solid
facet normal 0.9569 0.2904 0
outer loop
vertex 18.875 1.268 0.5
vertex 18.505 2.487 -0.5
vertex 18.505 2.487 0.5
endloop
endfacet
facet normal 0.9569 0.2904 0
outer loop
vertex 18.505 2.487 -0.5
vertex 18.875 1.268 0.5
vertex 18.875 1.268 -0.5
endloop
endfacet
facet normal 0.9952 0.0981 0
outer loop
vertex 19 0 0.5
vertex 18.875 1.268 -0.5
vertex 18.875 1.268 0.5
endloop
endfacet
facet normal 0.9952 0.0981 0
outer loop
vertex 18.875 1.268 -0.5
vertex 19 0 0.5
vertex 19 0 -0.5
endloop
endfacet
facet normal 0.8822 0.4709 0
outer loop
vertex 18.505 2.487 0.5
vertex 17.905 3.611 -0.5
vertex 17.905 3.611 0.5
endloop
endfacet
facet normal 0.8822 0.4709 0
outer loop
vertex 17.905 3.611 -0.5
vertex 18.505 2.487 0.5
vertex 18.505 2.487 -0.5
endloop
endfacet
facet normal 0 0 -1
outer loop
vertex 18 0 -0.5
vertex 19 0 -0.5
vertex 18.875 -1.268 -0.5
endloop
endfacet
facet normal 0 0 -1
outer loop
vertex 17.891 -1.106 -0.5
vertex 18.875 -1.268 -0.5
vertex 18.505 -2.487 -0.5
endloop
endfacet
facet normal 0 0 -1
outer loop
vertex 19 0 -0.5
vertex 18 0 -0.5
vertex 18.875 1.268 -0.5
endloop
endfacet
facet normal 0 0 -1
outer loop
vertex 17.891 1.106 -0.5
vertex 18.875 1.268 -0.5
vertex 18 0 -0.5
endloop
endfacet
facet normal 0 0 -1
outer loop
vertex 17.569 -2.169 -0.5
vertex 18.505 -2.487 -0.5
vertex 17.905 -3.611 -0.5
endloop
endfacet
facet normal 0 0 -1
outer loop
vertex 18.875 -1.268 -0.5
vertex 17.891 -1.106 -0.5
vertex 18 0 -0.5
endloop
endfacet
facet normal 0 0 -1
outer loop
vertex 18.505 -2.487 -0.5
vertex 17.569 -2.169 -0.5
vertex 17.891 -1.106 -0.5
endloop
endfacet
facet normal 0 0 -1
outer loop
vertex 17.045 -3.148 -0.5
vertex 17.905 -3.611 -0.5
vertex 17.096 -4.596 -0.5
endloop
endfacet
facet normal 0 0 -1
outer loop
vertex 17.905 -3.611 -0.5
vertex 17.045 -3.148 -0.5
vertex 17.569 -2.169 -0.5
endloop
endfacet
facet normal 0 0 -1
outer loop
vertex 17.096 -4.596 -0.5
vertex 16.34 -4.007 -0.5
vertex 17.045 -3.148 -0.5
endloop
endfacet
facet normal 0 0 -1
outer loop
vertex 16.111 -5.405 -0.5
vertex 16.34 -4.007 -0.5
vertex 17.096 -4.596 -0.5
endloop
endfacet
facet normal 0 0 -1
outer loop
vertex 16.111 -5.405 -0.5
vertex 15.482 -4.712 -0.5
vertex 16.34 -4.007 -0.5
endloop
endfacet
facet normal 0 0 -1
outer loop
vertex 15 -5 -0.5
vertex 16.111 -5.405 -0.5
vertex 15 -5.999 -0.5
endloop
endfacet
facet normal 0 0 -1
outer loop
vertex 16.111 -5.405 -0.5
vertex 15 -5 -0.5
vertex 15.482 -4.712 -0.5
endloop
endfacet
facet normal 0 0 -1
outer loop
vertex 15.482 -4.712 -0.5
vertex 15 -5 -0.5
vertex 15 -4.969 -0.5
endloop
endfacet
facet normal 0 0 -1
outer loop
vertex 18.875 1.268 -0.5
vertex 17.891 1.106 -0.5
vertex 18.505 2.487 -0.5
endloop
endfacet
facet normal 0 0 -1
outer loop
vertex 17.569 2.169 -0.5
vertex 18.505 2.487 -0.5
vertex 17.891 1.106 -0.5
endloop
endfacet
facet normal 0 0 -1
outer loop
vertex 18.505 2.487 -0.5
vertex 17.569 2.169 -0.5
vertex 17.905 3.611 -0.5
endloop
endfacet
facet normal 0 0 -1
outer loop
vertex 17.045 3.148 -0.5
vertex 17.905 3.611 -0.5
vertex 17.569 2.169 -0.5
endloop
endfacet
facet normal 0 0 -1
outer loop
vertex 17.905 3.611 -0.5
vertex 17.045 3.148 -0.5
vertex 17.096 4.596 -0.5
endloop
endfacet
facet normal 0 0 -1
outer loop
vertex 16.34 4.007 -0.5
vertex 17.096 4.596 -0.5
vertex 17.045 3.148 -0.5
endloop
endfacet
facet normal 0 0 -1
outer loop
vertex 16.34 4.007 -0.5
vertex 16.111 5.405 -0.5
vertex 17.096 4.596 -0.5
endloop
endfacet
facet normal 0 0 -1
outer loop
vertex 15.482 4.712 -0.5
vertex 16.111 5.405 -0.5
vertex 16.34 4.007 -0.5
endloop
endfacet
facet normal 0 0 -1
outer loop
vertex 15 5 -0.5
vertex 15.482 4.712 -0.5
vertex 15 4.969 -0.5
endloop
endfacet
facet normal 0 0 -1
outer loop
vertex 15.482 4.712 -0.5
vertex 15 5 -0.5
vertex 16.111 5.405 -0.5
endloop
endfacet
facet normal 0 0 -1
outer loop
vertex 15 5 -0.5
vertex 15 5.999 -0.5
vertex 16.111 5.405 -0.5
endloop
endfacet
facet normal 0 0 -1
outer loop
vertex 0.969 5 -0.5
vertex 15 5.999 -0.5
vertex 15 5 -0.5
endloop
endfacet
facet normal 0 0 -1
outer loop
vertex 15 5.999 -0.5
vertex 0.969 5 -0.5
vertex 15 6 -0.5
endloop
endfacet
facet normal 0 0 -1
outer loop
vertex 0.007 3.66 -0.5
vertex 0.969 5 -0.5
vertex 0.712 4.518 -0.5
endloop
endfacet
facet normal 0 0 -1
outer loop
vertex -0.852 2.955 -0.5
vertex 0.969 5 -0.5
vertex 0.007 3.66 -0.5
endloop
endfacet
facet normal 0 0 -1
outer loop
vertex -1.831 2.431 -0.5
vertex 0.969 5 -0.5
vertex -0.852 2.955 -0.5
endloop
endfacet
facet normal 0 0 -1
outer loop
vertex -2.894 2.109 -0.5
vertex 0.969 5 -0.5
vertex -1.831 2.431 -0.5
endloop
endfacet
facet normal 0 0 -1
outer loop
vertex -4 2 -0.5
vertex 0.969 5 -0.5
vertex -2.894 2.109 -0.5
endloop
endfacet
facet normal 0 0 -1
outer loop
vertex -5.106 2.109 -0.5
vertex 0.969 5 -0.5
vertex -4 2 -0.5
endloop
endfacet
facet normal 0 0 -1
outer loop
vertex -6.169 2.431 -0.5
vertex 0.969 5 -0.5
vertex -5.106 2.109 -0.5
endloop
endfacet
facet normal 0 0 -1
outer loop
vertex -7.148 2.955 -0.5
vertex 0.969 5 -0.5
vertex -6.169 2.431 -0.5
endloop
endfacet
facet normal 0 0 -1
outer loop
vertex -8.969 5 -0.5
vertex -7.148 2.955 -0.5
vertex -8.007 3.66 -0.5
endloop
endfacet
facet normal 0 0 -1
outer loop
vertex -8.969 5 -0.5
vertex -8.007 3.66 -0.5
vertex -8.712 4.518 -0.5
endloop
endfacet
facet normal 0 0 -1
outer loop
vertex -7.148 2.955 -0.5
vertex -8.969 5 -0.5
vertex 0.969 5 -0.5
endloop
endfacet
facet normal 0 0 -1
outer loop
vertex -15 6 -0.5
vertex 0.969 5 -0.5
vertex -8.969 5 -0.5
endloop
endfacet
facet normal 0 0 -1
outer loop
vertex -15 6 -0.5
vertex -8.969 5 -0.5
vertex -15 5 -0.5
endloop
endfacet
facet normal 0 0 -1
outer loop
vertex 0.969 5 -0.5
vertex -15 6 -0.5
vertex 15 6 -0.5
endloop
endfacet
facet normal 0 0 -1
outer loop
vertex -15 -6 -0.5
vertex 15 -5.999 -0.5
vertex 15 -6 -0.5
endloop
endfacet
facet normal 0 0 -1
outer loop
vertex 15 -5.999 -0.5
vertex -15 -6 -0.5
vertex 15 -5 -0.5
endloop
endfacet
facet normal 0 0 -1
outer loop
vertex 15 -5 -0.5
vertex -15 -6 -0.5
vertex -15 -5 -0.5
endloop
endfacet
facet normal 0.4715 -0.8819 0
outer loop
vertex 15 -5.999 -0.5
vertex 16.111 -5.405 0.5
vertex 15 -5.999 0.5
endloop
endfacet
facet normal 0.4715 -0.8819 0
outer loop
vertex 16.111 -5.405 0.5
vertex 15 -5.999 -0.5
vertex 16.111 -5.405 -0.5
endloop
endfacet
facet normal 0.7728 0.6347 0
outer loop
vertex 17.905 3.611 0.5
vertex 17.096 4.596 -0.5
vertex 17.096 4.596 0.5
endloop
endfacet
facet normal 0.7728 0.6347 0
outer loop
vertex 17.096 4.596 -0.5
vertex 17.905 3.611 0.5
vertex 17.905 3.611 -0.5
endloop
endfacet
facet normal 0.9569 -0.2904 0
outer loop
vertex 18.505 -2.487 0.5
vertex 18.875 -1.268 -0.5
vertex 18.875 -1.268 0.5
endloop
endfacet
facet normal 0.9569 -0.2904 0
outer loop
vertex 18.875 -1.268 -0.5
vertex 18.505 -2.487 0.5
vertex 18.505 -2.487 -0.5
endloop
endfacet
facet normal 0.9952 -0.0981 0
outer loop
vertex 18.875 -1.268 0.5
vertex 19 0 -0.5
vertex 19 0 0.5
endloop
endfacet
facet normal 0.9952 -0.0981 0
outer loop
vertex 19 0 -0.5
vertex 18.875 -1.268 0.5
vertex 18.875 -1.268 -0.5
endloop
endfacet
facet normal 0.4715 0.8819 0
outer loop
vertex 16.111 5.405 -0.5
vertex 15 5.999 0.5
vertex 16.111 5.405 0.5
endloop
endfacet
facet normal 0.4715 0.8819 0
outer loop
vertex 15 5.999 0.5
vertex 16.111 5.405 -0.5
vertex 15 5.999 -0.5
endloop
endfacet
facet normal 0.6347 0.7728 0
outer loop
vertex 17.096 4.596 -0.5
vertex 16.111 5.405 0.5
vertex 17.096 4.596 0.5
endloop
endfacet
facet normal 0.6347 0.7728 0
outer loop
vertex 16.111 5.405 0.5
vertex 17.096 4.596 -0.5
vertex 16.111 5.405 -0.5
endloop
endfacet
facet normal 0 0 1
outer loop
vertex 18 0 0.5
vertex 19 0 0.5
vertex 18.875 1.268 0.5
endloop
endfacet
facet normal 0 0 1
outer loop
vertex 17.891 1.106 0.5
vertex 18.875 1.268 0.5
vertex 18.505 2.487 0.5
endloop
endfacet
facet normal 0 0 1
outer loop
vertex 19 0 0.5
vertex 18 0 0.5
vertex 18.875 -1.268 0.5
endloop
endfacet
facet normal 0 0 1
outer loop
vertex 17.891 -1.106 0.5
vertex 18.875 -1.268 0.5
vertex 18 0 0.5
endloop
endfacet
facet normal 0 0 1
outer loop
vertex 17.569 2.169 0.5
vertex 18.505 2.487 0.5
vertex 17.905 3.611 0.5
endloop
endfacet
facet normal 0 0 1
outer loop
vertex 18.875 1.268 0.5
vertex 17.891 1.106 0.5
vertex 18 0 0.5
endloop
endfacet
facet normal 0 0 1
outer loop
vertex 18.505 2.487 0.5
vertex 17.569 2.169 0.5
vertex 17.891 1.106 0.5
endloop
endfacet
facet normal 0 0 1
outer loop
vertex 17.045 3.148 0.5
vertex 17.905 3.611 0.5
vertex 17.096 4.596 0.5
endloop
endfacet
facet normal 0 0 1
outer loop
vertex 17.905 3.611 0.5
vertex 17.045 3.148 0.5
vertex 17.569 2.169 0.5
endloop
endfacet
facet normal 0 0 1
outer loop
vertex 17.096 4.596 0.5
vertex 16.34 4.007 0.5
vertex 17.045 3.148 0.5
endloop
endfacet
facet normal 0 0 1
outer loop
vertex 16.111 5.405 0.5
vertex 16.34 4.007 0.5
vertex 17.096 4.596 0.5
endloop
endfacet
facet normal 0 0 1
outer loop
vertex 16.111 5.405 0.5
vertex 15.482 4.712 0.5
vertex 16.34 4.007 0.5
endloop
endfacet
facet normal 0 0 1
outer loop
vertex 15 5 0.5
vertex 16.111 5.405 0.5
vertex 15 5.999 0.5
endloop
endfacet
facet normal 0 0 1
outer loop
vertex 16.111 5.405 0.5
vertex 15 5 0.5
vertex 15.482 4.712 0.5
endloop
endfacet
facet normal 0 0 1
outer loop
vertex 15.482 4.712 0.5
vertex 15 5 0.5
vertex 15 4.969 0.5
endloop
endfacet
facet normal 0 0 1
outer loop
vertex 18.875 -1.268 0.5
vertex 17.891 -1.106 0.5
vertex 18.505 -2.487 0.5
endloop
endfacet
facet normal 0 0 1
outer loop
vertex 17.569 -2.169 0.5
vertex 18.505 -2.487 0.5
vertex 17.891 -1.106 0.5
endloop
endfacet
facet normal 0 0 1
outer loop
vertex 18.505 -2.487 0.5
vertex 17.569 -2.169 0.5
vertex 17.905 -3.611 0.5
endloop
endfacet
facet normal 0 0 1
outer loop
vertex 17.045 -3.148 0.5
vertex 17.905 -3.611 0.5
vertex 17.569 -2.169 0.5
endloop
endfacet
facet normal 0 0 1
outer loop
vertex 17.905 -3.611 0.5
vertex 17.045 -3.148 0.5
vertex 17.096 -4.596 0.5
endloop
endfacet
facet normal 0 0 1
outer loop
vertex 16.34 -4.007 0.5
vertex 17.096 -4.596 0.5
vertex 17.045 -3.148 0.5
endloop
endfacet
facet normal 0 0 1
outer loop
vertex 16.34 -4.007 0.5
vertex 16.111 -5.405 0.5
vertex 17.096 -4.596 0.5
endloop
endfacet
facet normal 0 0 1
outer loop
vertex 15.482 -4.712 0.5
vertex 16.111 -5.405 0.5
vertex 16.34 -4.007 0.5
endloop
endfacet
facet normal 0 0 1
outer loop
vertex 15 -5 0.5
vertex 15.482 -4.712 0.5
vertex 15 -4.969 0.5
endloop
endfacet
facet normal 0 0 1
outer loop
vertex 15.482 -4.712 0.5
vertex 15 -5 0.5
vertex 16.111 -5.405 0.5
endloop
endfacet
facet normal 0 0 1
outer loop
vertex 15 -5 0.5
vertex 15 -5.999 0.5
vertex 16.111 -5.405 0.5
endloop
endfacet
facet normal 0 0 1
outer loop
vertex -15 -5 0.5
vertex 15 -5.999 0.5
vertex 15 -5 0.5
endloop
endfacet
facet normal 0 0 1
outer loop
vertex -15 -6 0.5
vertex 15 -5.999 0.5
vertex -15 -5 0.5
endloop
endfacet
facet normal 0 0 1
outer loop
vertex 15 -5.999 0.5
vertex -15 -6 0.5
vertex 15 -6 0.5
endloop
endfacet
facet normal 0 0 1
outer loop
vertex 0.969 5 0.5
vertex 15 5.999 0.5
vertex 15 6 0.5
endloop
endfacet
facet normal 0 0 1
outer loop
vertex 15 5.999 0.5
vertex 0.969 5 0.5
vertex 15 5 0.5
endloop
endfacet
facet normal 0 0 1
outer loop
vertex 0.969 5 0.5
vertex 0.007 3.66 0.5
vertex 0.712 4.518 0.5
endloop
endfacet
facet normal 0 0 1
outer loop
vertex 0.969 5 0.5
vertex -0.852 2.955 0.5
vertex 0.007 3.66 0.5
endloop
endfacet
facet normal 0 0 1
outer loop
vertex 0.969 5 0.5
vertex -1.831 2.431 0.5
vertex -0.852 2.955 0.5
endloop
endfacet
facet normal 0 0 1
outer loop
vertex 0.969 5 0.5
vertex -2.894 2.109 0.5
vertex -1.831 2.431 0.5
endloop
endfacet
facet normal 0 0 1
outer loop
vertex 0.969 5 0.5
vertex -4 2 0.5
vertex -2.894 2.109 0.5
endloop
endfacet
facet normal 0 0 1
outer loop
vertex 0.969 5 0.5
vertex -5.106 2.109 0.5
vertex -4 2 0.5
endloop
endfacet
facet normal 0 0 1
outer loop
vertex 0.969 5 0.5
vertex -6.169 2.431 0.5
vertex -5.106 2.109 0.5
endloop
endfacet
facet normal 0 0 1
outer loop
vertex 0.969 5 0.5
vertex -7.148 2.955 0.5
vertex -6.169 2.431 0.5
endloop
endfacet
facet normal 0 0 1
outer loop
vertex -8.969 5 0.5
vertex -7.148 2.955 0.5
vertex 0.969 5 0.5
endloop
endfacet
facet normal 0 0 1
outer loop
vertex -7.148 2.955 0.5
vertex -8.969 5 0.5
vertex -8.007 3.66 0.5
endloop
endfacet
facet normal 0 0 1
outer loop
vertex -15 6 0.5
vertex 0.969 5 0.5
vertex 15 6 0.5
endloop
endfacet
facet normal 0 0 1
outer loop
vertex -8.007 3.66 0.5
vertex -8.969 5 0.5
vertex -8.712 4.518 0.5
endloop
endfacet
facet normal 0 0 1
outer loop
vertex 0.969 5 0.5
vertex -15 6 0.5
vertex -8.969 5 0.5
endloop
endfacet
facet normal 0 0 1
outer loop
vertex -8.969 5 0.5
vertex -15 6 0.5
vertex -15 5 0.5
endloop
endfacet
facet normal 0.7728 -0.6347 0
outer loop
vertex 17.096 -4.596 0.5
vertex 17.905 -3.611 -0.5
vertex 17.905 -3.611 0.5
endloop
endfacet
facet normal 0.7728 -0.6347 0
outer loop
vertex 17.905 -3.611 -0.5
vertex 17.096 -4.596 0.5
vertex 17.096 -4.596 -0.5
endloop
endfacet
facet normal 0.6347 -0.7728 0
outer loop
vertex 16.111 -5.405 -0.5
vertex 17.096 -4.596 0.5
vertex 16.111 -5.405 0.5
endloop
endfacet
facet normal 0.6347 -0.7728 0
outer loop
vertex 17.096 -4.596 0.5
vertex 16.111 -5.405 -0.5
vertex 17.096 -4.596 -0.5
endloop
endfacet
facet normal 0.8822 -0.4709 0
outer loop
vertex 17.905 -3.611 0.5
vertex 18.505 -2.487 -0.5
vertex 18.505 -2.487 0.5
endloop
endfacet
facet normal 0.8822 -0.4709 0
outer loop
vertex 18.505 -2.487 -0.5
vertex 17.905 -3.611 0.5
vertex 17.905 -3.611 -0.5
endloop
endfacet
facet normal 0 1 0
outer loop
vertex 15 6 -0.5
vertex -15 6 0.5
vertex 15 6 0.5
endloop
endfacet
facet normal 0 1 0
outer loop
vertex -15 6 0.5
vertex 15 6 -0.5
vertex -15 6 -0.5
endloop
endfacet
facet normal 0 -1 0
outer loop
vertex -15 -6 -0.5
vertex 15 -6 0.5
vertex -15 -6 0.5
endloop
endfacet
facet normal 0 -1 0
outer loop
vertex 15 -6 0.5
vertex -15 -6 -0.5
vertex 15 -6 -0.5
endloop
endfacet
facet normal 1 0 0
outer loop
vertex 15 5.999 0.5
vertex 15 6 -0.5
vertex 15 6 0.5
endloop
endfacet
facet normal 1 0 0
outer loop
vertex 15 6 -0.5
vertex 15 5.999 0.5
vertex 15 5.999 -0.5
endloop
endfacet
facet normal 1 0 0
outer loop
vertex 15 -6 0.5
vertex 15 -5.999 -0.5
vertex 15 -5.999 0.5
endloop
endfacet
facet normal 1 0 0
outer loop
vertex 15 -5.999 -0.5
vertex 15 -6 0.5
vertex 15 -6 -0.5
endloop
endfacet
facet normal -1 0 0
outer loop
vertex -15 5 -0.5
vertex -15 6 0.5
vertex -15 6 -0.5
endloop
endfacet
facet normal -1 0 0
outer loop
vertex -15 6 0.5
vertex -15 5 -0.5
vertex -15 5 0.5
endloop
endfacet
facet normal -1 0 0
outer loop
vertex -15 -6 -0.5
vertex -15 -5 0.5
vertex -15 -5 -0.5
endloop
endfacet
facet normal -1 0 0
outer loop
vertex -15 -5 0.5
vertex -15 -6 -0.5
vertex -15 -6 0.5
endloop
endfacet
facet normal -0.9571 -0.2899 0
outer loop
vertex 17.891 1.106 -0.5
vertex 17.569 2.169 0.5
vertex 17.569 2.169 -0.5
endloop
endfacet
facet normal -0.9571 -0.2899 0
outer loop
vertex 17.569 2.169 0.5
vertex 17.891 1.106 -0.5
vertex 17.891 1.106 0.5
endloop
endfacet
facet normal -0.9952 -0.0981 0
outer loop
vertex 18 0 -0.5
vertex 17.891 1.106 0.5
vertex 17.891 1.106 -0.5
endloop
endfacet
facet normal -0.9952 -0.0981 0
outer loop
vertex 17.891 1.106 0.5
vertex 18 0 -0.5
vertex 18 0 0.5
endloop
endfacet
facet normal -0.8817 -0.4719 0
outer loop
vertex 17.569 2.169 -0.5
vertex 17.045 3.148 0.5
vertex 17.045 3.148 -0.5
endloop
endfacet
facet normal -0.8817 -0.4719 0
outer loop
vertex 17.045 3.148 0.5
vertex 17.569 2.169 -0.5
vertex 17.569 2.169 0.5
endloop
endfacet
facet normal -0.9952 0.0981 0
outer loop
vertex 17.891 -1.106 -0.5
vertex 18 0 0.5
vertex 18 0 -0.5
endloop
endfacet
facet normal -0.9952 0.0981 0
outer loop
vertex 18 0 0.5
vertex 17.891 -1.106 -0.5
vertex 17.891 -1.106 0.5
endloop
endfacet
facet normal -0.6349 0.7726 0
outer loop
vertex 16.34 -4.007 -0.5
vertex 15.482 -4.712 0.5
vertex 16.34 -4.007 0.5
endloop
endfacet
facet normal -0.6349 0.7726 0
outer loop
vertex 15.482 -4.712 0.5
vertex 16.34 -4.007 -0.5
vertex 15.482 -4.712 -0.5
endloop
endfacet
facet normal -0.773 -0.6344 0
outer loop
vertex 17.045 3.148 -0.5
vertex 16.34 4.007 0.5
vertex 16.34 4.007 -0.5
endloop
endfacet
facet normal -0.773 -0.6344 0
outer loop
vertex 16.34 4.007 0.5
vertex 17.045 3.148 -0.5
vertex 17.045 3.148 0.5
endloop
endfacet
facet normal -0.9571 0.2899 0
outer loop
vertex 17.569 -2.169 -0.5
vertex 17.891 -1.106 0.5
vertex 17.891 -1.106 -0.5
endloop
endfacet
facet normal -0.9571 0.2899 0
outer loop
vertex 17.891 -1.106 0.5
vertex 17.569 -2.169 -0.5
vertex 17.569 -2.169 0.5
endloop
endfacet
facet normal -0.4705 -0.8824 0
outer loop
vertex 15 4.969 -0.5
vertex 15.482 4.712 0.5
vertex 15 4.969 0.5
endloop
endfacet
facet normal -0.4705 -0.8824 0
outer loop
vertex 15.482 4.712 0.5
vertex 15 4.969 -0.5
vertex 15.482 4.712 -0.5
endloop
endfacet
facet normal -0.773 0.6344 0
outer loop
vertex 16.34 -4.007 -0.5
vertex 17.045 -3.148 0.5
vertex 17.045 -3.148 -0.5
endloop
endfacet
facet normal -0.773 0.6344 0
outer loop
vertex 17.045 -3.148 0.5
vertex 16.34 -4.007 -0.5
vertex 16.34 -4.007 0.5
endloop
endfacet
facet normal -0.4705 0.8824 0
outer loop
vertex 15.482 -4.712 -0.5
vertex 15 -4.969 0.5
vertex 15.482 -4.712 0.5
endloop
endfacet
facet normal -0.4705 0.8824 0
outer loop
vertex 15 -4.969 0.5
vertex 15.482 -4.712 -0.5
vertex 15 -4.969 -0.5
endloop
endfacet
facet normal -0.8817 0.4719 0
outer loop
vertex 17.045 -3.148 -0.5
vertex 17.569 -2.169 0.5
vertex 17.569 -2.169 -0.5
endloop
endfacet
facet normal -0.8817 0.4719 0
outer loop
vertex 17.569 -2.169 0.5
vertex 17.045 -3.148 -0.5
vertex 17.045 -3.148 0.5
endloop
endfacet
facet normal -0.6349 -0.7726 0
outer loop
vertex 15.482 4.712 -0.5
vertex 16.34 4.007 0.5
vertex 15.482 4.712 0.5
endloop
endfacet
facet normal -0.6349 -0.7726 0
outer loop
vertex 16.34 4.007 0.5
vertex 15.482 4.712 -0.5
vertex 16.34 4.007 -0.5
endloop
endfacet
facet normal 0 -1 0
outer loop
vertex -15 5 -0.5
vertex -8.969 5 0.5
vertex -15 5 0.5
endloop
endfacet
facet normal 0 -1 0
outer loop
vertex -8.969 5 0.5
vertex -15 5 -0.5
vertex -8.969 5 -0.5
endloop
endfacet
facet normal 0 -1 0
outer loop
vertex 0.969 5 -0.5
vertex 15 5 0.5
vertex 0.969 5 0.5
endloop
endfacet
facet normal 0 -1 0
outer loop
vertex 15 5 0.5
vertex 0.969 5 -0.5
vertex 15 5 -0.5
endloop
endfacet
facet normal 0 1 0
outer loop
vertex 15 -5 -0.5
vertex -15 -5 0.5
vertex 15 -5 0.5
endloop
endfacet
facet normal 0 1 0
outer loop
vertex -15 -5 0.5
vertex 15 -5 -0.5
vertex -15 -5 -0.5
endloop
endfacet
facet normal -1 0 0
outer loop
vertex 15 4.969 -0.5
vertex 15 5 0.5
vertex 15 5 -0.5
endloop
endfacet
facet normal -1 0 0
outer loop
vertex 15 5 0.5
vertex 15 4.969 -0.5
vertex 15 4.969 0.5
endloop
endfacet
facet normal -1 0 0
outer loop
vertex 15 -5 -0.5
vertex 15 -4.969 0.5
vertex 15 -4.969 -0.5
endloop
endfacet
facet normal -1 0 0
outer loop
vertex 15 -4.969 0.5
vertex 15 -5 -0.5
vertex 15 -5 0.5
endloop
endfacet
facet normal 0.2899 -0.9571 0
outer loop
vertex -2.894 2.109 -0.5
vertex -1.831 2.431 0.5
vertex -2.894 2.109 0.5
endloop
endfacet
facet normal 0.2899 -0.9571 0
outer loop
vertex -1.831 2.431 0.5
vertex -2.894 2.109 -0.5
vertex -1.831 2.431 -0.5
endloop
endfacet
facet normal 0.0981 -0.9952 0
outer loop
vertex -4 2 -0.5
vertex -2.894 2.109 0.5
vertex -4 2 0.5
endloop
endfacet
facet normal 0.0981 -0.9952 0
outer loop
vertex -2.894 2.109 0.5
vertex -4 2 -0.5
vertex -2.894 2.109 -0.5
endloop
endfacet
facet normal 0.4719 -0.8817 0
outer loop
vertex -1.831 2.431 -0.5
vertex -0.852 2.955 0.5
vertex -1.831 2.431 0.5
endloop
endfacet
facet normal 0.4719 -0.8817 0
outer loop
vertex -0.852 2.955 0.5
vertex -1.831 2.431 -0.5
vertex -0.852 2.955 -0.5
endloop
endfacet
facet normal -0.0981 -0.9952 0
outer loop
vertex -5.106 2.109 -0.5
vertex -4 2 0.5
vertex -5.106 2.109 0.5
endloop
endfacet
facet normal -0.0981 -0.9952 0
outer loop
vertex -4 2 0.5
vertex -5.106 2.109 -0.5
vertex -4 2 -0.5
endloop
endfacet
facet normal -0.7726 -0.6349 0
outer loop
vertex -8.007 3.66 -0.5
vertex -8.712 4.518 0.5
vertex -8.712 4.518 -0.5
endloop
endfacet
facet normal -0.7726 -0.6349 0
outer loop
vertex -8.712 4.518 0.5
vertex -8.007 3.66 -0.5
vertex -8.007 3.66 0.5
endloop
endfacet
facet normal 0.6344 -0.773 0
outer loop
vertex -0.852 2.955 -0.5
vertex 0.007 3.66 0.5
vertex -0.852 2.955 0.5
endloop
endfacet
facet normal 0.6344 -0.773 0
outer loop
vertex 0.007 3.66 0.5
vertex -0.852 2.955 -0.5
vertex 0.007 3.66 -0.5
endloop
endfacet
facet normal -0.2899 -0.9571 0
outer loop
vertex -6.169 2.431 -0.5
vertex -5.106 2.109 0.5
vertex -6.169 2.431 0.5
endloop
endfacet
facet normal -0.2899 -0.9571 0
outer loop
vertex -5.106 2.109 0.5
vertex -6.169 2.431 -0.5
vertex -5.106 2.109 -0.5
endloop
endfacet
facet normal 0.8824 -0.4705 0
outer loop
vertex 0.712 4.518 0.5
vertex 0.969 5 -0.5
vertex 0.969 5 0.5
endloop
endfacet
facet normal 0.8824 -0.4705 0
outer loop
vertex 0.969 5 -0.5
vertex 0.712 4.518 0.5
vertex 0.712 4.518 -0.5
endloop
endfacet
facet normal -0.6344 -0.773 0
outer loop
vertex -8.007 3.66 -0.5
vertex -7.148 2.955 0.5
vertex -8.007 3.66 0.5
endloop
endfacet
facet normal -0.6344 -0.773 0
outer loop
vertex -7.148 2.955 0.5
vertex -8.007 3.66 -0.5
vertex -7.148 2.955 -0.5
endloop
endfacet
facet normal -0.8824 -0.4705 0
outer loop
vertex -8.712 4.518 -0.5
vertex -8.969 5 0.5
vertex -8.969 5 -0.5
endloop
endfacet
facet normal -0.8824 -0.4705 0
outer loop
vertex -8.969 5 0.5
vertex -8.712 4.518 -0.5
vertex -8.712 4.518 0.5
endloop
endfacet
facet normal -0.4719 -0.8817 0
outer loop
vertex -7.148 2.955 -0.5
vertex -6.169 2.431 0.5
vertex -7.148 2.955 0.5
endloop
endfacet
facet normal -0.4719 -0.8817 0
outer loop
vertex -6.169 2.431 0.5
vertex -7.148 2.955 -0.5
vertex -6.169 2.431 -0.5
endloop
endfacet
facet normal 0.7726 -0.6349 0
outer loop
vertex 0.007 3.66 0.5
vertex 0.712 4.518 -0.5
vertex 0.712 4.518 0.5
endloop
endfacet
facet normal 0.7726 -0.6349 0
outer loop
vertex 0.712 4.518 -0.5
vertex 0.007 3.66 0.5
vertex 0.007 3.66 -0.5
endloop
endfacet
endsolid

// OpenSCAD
desk_thickness = 10;
desk_bump_depth = 3;
desk_bump_width = 10;
desk_bump_distance_to_edge = 14;

// models a clip for the edge of my standing desk
module desk_mount(l, d, t) {
    difference() {
        extended_cap(desk_bump_depth+t, desk_thickness+t*2, d,l );
        translate([-0.5,0,0])desk_edge(l+1, d+1);
    }
}

// models the edge of my standing desk
module desk_edge(l, t) {
    difference() {
        extended_cap(desk_bump_depth, desk_thickness, t, l);
        translate([l/2-desk_bump_width/2-desk_bump_distance_to_edge,desk_thickness/2,0]) rotate([0,0,-90]) rounded_cap(desk_bump_depth, desk_bump_width, t+1);
    }
}

// extends rounded_cap with an unlimeted extension value.
module extended_cap(h, w, t, e) {
    union() {
        cube([e, w, t], center=true);
        translate([e/2,0,0]) rounded_cap(h, w, t, e=min([e, 1]));
    }
}

// A function to generate a cylinder with two of its sides clipped.
// w = max width of the cylinder.
// o = the center offset. 0 is centered. 1 or -1 is at the edge of the clipped section
module rounded_cap(h, w, t, e=1) {
    r = (h/2) + ((w*w)/(8*h));
    c = h-r;
    translate([c,0,0]) intersection() {
        cylinder(h=t, r=r, center=true, $fn=32);
        translate([-c-e,-w/2,-t/2]) cube([h+e, w, t]);
    }
}

//output:desk_mount:desk_mount(30, 1, 1);

//view
desk_mount(30, 1, 1);
